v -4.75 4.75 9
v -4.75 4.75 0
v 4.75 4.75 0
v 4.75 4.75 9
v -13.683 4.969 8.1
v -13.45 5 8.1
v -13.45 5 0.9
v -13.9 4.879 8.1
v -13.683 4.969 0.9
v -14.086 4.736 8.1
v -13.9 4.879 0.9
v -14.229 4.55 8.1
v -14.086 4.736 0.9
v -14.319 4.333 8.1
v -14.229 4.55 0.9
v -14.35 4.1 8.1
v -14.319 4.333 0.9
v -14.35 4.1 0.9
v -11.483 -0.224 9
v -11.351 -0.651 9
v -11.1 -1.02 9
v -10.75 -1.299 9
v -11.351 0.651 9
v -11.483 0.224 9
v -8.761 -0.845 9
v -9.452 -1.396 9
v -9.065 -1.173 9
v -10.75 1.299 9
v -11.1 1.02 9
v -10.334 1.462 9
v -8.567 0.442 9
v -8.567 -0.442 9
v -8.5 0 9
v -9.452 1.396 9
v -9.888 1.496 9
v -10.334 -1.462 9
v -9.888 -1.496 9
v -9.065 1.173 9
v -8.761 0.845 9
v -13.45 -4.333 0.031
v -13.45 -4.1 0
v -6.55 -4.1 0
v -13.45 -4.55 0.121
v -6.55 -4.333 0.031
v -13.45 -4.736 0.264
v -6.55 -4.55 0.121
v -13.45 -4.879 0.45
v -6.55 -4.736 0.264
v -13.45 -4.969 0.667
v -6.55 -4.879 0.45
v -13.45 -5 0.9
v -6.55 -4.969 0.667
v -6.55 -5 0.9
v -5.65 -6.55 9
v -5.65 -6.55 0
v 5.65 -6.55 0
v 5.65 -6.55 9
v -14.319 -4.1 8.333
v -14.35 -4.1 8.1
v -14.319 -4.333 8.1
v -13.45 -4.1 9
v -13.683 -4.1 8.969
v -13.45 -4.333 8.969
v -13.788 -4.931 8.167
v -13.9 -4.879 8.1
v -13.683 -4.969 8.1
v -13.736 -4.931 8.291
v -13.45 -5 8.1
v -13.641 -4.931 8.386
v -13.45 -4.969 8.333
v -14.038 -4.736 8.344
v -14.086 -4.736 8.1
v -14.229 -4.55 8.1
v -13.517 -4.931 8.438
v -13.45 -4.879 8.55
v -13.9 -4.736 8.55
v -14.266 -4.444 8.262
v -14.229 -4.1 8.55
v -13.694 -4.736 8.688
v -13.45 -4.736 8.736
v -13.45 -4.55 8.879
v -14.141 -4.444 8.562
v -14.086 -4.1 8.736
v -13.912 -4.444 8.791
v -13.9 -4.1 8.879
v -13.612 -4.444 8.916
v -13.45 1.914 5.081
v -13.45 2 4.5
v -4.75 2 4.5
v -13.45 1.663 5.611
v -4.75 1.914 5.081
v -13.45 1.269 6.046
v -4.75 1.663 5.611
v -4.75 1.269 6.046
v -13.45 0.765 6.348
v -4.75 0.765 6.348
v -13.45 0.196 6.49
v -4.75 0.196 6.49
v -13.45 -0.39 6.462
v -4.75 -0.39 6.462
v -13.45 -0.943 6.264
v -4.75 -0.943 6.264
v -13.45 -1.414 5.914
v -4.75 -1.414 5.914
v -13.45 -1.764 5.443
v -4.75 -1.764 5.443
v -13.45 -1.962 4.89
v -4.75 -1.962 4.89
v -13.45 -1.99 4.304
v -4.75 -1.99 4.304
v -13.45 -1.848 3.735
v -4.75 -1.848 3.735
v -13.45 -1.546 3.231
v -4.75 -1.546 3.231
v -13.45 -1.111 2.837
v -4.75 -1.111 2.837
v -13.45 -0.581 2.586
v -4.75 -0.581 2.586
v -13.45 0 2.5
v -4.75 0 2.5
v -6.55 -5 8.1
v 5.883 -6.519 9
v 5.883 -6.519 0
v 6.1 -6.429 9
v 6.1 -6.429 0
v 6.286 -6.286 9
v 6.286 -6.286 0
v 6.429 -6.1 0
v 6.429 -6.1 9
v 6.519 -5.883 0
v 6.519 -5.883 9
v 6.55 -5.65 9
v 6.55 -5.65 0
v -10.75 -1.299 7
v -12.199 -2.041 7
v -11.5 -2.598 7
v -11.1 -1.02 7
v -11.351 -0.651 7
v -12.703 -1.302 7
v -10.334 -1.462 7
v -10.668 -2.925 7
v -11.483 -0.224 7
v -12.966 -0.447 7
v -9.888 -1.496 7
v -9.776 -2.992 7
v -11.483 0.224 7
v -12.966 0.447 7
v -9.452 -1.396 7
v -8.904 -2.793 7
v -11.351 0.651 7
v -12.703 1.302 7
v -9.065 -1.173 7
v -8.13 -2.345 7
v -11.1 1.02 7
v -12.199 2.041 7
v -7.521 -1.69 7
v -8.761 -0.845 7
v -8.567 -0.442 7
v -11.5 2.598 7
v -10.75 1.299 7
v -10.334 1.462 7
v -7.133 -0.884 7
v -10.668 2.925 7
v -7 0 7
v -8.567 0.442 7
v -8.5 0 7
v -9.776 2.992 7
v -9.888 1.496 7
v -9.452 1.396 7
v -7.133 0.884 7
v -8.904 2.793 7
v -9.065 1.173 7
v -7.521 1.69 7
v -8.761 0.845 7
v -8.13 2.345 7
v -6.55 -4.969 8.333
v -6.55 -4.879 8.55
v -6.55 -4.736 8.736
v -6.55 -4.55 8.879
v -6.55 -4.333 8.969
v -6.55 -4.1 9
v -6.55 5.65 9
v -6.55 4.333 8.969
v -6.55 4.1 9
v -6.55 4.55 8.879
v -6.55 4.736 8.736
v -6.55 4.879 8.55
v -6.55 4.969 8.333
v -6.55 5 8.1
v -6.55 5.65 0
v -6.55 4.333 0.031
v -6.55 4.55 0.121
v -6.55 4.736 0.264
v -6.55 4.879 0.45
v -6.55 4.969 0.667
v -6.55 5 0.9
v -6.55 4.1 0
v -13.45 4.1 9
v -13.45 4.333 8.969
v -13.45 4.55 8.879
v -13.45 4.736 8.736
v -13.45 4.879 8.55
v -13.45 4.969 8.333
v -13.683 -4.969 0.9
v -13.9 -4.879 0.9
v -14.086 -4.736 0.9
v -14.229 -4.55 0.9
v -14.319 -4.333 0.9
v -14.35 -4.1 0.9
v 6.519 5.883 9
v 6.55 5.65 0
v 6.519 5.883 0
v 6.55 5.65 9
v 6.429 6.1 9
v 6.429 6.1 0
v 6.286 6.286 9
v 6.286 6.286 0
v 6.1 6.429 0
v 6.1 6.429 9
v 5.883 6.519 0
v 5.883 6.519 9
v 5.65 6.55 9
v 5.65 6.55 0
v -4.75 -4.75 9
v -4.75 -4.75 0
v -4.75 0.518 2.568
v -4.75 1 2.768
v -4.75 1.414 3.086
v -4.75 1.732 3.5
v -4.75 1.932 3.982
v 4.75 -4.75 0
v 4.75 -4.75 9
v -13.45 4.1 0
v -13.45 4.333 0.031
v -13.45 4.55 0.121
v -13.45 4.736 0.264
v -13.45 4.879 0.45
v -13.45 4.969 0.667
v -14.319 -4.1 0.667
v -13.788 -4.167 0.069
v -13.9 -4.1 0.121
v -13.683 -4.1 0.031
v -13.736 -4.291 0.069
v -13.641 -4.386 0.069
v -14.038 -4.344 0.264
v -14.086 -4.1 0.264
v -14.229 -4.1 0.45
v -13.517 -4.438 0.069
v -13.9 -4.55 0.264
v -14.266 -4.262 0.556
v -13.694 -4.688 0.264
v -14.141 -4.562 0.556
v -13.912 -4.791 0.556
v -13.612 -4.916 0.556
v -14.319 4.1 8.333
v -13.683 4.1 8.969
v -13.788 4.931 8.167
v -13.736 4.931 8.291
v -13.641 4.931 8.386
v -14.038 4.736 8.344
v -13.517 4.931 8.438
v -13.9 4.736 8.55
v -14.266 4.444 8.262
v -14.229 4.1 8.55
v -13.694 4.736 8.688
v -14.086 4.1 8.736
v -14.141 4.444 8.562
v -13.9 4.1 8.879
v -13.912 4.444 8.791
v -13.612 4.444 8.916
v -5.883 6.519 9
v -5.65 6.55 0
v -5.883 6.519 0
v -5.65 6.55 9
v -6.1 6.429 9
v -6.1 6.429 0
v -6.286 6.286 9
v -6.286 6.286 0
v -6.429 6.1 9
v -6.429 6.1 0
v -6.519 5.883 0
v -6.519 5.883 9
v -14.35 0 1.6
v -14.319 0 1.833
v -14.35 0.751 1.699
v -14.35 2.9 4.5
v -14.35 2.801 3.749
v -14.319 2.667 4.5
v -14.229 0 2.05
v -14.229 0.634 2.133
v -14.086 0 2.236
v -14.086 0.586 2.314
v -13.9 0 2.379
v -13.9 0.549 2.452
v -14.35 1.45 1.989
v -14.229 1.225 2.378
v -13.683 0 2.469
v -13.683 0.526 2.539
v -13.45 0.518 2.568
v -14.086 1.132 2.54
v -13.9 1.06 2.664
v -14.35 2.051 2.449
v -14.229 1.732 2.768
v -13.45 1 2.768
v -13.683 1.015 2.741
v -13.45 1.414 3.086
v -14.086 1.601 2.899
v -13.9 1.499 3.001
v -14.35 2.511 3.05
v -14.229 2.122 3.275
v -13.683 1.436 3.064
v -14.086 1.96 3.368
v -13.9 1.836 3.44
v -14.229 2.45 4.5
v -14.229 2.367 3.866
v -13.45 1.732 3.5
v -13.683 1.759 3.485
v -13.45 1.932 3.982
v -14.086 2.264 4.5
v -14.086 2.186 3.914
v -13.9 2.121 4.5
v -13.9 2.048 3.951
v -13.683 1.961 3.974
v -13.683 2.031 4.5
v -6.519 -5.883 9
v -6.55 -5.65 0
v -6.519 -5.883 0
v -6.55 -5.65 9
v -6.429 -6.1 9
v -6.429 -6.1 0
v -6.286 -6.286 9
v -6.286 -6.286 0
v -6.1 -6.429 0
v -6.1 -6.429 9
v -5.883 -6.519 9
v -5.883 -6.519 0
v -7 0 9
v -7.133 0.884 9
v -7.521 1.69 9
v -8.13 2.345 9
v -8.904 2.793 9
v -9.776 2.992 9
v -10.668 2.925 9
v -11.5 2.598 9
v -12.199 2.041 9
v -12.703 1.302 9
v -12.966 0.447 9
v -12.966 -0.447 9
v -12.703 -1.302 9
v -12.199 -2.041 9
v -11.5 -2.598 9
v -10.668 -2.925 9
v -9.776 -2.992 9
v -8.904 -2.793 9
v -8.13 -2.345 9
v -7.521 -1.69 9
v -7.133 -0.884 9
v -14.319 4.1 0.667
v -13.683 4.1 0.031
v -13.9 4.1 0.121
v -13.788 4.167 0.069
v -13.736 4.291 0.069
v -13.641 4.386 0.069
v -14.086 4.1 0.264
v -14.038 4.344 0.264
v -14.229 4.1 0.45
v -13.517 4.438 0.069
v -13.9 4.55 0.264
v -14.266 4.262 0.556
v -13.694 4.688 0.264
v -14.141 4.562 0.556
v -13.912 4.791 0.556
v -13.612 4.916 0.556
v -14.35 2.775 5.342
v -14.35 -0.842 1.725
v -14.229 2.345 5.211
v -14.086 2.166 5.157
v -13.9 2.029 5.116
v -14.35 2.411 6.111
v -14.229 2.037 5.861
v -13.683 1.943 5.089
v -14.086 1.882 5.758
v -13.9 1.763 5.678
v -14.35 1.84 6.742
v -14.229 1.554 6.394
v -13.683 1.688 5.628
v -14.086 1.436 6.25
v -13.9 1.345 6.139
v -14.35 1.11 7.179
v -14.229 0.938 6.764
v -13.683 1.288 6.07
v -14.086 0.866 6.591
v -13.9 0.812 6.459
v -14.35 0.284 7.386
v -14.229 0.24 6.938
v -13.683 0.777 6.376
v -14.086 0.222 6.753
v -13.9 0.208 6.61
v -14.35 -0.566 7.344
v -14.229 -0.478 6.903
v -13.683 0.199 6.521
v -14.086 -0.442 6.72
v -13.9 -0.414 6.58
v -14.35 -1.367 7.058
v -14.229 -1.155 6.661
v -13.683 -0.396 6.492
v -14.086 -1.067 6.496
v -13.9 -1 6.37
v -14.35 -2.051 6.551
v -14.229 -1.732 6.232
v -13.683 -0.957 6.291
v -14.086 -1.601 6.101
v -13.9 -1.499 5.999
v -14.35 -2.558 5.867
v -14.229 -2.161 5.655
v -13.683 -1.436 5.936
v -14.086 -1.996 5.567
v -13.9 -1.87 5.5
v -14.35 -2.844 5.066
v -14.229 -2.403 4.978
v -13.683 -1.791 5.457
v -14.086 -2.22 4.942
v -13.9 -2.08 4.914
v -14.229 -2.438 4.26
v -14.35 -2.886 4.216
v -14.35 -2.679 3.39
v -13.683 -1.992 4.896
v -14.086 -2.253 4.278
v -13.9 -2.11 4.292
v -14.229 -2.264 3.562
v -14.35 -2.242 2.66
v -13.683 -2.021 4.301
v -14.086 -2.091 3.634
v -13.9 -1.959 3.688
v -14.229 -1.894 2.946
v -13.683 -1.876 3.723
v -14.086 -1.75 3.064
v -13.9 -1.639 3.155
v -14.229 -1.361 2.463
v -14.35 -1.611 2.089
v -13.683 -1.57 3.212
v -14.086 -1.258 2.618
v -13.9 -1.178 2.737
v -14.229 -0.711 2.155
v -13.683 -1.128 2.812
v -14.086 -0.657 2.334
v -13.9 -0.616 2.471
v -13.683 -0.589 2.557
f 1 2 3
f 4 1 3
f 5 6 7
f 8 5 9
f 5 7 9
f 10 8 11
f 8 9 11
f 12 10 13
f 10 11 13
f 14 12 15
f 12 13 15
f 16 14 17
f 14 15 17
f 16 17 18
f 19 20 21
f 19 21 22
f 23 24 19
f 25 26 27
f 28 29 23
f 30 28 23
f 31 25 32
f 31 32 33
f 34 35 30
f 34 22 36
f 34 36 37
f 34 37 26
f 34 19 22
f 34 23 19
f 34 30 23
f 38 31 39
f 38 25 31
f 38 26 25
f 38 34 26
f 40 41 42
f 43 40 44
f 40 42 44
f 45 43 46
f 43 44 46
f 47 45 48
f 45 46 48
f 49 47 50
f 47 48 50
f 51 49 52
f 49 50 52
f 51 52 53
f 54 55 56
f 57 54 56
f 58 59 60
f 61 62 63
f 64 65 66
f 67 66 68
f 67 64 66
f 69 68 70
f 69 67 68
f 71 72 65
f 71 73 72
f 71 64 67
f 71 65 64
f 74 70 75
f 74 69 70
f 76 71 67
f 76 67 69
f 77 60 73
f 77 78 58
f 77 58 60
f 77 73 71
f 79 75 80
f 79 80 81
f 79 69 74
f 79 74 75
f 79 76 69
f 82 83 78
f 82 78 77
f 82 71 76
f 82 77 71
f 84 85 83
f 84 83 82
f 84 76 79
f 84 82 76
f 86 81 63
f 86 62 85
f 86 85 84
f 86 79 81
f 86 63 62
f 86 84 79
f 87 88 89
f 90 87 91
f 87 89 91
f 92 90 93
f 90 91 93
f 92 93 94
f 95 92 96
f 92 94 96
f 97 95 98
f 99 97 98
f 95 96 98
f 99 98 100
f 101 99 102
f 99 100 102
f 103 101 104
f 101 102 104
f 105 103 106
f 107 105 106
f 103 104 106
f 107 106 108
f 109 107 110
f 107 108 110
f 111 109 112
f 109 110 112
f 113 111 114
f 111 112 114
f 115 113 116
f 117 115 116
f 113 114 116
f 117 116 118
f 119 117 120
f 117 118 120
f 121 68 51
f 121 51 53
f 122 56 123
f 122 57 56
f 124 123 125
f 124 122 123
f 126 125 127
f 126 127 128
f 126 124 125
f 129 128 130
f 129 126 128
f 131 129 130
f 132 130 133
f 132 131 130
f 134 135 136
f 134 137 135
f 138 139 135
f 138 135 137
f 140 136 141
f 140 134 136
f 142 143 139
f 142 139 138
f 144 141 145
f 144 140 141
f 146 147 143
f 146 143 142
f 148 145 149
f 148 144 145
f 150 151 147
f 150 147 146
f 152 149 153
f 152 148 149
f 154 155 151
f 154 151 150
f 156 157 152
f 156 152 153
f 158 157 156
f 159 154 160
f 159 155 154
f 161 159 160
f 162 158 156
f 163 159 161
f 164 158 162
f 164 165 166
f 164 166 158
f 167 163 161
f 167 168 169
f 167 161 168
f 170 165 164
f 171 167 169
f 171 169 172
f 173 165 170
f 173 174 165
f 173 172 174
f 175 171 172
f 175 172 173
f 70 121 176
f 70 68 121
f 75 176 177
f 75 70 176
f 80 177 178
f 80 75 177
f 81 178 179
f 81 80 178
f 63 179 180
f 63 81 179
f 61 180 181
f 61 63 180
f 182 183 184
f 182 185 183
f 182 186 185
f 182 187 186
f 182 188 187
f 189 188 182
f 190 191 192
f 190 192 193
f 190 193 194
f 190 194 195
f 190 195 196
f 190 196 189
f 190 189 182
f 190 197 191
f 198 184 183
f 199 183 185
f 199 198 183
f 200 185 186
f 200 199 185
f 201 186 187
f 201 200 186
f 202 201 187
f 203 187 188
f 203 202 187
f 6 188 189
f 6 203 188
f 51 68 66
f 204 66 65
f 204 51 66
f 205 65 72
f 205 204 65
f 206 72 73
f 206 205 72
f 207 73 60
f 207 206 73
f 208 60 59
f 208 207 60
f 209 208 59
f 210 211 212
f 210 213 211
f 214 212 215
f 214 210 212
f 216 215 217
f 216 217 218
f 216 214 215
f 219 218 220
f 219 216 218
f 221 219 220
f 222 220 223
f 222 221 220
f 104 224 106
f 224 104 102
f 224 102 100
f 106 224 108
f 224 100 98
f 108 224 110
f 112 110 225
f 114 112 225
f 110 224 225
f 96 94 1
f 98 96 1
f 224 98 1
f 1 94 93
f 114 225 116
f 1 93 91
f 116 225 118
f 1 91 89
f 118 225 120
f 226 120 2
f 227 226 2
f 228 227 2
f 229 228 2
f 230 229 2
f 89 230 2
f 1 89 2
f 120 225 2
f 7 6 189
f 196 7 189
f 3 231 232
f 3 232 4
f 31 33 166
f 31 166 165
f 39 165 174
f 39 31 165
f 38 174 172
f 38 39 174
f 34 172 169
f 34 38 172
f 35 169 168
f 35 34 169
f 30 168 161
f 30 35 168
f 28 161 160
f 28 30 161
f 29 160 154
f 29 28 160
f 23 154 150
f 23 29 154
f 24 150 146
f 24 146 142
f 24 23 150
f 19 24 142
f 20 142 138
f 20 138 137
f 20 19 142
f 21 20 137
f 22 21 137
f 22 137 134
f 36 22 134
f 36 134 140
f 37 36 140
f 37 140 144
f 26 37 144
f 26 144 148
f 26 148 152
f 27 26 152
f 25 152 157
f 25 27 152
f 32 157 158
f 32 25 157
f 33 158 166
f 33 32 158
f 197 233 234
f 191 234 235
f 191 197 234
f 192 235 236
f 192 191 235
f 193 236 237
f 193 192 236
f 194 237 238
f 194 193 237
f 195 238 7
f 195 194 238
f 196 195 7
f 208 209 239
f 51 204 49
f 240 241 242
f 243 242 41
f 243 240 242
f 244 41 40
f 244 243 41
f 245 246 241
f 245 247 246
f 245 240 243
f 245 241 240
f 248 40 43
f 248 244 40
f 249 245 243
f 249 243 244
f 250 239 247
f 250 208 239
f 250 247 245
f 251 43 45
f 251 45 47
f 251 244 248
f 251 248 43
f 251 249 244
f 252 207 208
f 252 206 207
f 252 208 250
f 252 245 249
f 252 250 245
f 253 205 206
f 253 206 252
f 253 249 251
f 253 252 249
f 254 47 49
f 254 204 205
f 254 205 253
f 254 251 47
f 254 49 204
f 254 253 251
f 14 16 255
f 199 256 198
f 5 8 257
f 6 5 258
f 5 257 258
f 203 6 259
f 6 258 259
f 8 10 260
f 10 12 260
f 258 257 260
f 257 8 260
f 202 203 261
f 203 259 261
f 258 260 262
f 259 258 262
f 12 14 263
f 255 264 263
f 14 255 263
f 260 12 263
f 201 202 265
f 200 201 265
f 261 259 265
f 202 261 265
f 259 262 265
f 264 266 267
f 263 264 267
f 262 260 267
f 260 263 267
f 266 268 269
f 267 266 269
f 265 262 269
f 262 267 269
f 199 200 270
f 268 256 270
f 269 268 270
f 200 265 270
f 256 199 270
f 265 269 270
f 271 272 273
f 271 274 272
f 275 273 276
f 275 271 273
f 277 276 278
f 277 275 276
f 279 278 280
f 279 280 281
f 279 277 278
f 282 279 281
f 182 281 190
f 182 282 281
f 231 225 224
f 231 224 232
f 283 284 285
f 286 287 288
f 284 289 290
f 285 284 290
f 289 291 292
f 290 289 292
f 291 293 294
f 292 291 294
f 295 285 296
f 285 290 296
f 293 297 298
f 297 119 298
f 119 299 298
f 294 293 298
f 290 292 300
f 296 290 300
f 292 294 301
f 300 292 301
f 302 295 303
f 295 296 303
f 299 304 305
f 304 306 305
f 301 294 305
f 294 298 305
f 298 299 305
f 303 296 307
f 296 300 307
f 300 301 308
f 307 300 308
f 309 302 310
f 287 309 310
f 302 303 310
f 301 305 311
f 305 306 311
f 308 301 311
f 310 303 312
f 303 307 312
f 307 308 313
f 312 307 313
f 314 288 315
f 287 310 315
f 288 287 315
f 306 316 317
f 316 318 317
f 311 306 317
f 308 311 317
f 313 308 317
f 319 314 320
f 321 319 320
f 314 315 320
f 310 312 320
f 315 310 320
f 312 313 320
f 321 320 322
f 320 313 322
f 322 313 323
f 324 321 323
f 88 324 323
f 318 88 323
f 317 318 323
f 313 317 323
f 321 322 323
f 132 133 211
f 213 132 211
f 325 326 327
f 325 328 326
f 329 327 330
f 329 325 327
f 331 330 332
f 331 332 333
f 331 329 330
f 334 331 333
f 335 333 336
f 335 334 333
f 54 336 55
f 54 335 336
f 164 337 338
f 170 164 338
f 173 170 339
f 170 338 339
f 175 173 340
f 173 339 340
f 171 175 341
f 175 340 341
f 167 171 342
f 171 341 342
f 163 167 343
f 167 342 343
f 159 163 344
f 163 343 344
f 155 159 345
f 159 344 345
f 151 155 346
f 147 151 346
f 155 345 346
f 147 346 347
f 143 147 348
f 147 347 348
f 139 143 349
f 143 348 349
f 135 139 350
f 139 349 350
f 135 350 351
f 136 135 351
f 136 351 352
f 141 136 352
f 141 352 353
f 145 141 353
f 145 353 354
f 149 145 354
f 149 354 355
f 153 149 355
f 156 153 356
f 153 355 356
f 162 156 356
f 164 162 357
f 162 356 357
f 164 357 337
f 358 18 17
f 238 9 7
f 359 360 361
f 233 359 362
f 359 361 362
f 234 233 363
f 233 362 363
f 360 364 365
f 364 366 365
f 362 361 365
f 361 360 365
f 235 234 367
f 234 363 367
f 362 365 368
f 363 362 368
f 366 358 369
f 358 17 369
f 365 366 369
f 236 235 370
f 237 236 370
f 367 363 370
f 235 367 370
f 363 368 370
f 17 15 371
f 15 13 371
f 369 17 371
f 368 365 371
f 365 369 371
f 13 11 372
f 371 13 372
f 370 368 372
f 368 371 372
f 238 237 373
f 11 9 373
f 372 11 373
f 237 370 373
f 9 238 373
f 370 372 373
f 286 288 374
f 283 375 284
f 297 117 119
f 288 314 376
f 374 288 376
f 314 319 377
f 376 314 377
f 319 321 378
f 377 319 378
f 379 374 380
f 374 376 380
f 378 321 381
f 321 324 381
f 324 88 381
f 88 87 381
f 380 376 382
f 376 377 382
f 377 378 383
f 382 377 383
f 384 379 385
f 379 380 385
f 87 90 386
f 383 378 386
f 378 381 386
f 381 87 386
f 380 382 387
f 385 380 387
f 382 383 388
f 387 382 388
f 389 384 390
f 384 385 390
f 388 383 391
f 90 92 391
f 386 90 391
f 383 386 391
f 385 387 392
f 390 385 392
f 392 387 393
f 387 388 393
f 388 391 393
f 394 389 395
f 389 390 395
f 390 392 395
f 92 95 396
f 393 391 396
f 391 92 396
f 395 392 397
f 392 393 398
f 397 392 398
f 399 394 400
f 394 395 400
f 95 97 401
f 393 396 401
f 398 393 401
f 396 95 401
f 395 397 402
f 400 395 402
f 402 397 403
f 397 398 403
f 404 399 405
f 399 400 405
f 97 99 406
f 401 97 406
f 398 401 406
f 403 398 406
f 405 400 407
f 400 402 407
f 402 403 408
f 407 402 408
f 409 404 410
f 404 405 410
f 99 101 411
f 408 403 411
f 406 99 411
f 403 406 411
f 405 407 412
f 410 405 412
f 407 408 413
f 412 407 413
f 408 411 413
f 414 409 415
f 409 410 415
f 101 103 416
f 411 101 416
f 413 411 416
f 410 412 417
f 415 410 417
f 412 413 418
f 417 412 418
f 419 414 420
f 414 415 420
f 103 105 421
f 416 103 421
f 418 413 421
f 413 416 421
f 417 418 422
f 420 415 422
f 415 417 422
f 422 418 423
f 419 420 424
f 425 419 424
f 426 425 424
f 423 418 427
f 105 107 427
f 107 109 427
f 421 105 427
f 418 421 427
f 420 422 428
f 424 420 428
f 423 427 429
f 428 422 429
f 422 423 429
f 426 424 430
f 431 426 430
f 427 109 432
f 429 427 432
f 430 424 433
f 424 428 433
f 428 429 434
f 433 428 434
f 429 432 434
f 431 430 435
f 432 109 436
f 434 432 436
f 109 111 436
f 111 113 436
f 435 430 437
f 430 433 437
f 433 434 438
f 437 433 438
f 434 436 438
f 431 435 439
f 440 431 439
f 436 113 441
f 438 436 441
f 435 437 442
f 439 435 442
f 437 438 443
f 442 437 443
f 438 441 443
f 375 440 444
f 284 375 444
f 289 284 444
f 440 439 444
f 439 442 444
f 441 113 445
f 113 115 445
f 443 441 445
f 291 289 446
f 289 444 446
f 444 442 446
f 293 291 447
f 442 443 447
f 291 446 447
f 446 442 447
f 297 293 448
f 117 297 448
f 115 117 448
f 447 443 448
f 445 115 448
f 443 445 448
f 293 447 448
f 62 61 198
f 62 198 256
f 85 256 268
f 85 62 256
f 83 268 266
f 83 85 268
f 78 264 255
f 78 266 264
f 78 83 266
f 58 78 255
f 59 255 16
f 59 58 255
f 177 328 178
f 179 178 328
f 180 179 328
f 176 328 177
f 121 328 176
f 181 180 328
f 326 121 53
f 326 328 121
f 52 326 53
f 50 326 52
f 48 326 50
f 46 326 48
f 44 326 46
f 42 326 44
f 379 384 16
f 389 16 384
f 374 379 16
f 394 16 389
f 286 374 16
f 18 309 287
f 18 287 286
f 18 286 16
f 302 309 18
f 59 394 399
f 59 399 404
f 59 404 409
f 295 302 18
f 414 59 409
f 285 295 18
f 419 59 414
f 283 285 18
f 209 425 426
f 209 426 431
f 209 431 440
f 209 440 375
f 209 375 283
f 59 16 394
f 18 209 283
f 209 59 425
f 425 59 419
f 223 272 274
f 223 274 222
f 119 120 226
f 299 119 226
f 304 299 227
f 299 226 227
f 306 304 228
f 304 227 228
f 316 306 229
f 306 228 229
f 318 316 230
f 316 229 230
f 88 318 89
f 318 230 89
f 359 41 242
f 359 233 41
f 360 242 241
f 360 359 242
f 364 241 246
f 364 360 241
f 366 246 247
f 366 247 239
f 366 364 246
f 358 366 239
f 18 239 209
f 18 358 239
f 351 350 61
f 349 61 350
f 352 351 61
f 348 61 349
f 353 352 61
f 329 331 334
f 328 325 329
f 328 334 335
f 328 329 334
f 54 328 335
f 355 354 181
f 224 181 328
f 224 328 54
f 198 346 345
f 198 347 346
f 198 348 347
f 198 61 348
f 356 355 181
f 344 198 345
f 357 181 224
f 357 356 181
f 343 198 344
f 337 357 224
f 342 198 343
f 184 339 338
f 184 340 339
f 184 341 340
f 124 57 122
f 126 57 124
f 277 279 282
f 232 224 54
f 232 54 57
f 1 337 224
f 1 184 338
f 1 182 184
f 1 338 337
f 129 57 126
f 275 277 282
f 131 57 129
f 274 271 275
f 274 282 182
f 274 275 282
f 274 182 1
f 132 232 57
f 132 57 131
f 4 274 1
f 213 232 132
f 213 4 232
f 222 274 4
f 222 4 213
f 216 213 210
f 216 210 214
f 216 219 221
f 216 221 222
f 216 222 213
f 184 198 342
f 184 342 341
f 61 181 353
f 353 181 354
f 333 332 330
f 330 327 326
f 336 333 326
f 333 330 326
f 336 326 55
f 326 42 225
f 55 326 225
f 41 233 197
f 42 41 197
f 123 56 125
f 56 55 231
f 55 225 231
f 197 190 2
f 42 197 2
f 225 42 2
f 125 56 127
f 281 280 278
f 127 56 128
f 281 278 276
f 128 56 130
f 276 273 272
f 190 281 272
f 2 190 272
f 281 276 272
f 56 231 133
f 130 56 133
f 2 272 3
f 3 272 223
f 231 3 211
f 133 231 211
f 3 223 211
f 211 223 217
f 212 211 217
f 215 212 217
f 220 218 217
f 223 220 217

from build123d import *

# Parameters (mm, degrees)
F0_W     = 13.1
F0_H     = 13.1
F0_W_2   = 9.5
F0_H_2   = 9.5
F1_DEPTH = 9
F3_DEPTH = 5
F5_R     = 3
F5_R_2   = 1.5
F6_DEPTH = 2
F8_DEPTH = 25
F9_R     = 0.9


with BuildPart() as f1:
    # F0 (on Top) → F1 (new body)
    with BuildSketch(Plane.XY):
        Rectangle(F0_W, F0_H)
        Rectangle(F0_W_2, F0_H_2, mode=Mode.SUBTRACT)
    extrude(amount=F1_DEPTH)

    # F2 (on Front) → F3 (join, symmetric)
    with BuildSketch(Plane.XZ):
        Polygon((-6.55, 0), (-6.55, 4.5), (-9.55, 4.5), (-9.55, 6.775), (-11.05, 6.775), (-11.05, 4.5), (-12.85, 4.5), (-12.85, 6.775), (-14.35, 6.775), (-14.35, 2.975), align=None)
        Polygon((-9.55, 4.5), (-6.55, 4.5), (-6.55, 9), (-14.35, 9), (-14.35, 6.775), (-12.85, 6.775), (-12.85, 4.5), (-11.05, 4.5), (-11.05, 6.775), (-9.55, 6.775), align=None)
        Polygon((-14.35, 0), (-6.55, 0), (-14.35, 2.975), align=None)
    extrude(amount=F3_DEPTH, both=True)

    # F5 (on offset) → F6 (cut)
    with BuildSketch(Plane.XY.offset(9)):
        with Locations((-10, 0)):
            Circle(F5_R)
        with Locations((-10, 0)):
            Circle(F5_R_2, mode=Mode.SUBTRACT)
    extrude(amount=-F6_DEPTH, mode=Mode.SUBTRACT)

    # F7 (on Right) → F8 (cut)
    with BuildSketch(Plane.YZ):
        with BuildLine():
            ThreePointArc((0, 2.5), (1.4142135624, 3.0857864376), (2, 4.5))
            ThreePointArc((2, 4.5), (-1.4142135624, 5.9142135624), (0, 2.5))
        make_face()
    extrude(amount=-F8_DEPTH, mode=Mode.SUBTRACT)

    # F9
    f9_edges = [f1.edges().sort_by_distance(p)[0] for p in [
        (-14.35, 0, 9),
        (-14.35, 5, 4.5),
        (-14.35, -5, 4.5),
        (-14.35, 0, 0),
        (-14.35, 0, 6.5),
        (-6.55, 6.55, 4.5),
        (6.55, 6.55, 4.5),
        (-6.55, -6.55, 4.5),
        (-10.45, 5, 9),
        (-10.45, 5, 0),
        (6.55, -6.55, 4.5),
        (-10.45, -5, 0),
        (-10.45, -5, 9),
    ]]
    fillet(f9_edges, radius=F9_R)


solid = f1.part
